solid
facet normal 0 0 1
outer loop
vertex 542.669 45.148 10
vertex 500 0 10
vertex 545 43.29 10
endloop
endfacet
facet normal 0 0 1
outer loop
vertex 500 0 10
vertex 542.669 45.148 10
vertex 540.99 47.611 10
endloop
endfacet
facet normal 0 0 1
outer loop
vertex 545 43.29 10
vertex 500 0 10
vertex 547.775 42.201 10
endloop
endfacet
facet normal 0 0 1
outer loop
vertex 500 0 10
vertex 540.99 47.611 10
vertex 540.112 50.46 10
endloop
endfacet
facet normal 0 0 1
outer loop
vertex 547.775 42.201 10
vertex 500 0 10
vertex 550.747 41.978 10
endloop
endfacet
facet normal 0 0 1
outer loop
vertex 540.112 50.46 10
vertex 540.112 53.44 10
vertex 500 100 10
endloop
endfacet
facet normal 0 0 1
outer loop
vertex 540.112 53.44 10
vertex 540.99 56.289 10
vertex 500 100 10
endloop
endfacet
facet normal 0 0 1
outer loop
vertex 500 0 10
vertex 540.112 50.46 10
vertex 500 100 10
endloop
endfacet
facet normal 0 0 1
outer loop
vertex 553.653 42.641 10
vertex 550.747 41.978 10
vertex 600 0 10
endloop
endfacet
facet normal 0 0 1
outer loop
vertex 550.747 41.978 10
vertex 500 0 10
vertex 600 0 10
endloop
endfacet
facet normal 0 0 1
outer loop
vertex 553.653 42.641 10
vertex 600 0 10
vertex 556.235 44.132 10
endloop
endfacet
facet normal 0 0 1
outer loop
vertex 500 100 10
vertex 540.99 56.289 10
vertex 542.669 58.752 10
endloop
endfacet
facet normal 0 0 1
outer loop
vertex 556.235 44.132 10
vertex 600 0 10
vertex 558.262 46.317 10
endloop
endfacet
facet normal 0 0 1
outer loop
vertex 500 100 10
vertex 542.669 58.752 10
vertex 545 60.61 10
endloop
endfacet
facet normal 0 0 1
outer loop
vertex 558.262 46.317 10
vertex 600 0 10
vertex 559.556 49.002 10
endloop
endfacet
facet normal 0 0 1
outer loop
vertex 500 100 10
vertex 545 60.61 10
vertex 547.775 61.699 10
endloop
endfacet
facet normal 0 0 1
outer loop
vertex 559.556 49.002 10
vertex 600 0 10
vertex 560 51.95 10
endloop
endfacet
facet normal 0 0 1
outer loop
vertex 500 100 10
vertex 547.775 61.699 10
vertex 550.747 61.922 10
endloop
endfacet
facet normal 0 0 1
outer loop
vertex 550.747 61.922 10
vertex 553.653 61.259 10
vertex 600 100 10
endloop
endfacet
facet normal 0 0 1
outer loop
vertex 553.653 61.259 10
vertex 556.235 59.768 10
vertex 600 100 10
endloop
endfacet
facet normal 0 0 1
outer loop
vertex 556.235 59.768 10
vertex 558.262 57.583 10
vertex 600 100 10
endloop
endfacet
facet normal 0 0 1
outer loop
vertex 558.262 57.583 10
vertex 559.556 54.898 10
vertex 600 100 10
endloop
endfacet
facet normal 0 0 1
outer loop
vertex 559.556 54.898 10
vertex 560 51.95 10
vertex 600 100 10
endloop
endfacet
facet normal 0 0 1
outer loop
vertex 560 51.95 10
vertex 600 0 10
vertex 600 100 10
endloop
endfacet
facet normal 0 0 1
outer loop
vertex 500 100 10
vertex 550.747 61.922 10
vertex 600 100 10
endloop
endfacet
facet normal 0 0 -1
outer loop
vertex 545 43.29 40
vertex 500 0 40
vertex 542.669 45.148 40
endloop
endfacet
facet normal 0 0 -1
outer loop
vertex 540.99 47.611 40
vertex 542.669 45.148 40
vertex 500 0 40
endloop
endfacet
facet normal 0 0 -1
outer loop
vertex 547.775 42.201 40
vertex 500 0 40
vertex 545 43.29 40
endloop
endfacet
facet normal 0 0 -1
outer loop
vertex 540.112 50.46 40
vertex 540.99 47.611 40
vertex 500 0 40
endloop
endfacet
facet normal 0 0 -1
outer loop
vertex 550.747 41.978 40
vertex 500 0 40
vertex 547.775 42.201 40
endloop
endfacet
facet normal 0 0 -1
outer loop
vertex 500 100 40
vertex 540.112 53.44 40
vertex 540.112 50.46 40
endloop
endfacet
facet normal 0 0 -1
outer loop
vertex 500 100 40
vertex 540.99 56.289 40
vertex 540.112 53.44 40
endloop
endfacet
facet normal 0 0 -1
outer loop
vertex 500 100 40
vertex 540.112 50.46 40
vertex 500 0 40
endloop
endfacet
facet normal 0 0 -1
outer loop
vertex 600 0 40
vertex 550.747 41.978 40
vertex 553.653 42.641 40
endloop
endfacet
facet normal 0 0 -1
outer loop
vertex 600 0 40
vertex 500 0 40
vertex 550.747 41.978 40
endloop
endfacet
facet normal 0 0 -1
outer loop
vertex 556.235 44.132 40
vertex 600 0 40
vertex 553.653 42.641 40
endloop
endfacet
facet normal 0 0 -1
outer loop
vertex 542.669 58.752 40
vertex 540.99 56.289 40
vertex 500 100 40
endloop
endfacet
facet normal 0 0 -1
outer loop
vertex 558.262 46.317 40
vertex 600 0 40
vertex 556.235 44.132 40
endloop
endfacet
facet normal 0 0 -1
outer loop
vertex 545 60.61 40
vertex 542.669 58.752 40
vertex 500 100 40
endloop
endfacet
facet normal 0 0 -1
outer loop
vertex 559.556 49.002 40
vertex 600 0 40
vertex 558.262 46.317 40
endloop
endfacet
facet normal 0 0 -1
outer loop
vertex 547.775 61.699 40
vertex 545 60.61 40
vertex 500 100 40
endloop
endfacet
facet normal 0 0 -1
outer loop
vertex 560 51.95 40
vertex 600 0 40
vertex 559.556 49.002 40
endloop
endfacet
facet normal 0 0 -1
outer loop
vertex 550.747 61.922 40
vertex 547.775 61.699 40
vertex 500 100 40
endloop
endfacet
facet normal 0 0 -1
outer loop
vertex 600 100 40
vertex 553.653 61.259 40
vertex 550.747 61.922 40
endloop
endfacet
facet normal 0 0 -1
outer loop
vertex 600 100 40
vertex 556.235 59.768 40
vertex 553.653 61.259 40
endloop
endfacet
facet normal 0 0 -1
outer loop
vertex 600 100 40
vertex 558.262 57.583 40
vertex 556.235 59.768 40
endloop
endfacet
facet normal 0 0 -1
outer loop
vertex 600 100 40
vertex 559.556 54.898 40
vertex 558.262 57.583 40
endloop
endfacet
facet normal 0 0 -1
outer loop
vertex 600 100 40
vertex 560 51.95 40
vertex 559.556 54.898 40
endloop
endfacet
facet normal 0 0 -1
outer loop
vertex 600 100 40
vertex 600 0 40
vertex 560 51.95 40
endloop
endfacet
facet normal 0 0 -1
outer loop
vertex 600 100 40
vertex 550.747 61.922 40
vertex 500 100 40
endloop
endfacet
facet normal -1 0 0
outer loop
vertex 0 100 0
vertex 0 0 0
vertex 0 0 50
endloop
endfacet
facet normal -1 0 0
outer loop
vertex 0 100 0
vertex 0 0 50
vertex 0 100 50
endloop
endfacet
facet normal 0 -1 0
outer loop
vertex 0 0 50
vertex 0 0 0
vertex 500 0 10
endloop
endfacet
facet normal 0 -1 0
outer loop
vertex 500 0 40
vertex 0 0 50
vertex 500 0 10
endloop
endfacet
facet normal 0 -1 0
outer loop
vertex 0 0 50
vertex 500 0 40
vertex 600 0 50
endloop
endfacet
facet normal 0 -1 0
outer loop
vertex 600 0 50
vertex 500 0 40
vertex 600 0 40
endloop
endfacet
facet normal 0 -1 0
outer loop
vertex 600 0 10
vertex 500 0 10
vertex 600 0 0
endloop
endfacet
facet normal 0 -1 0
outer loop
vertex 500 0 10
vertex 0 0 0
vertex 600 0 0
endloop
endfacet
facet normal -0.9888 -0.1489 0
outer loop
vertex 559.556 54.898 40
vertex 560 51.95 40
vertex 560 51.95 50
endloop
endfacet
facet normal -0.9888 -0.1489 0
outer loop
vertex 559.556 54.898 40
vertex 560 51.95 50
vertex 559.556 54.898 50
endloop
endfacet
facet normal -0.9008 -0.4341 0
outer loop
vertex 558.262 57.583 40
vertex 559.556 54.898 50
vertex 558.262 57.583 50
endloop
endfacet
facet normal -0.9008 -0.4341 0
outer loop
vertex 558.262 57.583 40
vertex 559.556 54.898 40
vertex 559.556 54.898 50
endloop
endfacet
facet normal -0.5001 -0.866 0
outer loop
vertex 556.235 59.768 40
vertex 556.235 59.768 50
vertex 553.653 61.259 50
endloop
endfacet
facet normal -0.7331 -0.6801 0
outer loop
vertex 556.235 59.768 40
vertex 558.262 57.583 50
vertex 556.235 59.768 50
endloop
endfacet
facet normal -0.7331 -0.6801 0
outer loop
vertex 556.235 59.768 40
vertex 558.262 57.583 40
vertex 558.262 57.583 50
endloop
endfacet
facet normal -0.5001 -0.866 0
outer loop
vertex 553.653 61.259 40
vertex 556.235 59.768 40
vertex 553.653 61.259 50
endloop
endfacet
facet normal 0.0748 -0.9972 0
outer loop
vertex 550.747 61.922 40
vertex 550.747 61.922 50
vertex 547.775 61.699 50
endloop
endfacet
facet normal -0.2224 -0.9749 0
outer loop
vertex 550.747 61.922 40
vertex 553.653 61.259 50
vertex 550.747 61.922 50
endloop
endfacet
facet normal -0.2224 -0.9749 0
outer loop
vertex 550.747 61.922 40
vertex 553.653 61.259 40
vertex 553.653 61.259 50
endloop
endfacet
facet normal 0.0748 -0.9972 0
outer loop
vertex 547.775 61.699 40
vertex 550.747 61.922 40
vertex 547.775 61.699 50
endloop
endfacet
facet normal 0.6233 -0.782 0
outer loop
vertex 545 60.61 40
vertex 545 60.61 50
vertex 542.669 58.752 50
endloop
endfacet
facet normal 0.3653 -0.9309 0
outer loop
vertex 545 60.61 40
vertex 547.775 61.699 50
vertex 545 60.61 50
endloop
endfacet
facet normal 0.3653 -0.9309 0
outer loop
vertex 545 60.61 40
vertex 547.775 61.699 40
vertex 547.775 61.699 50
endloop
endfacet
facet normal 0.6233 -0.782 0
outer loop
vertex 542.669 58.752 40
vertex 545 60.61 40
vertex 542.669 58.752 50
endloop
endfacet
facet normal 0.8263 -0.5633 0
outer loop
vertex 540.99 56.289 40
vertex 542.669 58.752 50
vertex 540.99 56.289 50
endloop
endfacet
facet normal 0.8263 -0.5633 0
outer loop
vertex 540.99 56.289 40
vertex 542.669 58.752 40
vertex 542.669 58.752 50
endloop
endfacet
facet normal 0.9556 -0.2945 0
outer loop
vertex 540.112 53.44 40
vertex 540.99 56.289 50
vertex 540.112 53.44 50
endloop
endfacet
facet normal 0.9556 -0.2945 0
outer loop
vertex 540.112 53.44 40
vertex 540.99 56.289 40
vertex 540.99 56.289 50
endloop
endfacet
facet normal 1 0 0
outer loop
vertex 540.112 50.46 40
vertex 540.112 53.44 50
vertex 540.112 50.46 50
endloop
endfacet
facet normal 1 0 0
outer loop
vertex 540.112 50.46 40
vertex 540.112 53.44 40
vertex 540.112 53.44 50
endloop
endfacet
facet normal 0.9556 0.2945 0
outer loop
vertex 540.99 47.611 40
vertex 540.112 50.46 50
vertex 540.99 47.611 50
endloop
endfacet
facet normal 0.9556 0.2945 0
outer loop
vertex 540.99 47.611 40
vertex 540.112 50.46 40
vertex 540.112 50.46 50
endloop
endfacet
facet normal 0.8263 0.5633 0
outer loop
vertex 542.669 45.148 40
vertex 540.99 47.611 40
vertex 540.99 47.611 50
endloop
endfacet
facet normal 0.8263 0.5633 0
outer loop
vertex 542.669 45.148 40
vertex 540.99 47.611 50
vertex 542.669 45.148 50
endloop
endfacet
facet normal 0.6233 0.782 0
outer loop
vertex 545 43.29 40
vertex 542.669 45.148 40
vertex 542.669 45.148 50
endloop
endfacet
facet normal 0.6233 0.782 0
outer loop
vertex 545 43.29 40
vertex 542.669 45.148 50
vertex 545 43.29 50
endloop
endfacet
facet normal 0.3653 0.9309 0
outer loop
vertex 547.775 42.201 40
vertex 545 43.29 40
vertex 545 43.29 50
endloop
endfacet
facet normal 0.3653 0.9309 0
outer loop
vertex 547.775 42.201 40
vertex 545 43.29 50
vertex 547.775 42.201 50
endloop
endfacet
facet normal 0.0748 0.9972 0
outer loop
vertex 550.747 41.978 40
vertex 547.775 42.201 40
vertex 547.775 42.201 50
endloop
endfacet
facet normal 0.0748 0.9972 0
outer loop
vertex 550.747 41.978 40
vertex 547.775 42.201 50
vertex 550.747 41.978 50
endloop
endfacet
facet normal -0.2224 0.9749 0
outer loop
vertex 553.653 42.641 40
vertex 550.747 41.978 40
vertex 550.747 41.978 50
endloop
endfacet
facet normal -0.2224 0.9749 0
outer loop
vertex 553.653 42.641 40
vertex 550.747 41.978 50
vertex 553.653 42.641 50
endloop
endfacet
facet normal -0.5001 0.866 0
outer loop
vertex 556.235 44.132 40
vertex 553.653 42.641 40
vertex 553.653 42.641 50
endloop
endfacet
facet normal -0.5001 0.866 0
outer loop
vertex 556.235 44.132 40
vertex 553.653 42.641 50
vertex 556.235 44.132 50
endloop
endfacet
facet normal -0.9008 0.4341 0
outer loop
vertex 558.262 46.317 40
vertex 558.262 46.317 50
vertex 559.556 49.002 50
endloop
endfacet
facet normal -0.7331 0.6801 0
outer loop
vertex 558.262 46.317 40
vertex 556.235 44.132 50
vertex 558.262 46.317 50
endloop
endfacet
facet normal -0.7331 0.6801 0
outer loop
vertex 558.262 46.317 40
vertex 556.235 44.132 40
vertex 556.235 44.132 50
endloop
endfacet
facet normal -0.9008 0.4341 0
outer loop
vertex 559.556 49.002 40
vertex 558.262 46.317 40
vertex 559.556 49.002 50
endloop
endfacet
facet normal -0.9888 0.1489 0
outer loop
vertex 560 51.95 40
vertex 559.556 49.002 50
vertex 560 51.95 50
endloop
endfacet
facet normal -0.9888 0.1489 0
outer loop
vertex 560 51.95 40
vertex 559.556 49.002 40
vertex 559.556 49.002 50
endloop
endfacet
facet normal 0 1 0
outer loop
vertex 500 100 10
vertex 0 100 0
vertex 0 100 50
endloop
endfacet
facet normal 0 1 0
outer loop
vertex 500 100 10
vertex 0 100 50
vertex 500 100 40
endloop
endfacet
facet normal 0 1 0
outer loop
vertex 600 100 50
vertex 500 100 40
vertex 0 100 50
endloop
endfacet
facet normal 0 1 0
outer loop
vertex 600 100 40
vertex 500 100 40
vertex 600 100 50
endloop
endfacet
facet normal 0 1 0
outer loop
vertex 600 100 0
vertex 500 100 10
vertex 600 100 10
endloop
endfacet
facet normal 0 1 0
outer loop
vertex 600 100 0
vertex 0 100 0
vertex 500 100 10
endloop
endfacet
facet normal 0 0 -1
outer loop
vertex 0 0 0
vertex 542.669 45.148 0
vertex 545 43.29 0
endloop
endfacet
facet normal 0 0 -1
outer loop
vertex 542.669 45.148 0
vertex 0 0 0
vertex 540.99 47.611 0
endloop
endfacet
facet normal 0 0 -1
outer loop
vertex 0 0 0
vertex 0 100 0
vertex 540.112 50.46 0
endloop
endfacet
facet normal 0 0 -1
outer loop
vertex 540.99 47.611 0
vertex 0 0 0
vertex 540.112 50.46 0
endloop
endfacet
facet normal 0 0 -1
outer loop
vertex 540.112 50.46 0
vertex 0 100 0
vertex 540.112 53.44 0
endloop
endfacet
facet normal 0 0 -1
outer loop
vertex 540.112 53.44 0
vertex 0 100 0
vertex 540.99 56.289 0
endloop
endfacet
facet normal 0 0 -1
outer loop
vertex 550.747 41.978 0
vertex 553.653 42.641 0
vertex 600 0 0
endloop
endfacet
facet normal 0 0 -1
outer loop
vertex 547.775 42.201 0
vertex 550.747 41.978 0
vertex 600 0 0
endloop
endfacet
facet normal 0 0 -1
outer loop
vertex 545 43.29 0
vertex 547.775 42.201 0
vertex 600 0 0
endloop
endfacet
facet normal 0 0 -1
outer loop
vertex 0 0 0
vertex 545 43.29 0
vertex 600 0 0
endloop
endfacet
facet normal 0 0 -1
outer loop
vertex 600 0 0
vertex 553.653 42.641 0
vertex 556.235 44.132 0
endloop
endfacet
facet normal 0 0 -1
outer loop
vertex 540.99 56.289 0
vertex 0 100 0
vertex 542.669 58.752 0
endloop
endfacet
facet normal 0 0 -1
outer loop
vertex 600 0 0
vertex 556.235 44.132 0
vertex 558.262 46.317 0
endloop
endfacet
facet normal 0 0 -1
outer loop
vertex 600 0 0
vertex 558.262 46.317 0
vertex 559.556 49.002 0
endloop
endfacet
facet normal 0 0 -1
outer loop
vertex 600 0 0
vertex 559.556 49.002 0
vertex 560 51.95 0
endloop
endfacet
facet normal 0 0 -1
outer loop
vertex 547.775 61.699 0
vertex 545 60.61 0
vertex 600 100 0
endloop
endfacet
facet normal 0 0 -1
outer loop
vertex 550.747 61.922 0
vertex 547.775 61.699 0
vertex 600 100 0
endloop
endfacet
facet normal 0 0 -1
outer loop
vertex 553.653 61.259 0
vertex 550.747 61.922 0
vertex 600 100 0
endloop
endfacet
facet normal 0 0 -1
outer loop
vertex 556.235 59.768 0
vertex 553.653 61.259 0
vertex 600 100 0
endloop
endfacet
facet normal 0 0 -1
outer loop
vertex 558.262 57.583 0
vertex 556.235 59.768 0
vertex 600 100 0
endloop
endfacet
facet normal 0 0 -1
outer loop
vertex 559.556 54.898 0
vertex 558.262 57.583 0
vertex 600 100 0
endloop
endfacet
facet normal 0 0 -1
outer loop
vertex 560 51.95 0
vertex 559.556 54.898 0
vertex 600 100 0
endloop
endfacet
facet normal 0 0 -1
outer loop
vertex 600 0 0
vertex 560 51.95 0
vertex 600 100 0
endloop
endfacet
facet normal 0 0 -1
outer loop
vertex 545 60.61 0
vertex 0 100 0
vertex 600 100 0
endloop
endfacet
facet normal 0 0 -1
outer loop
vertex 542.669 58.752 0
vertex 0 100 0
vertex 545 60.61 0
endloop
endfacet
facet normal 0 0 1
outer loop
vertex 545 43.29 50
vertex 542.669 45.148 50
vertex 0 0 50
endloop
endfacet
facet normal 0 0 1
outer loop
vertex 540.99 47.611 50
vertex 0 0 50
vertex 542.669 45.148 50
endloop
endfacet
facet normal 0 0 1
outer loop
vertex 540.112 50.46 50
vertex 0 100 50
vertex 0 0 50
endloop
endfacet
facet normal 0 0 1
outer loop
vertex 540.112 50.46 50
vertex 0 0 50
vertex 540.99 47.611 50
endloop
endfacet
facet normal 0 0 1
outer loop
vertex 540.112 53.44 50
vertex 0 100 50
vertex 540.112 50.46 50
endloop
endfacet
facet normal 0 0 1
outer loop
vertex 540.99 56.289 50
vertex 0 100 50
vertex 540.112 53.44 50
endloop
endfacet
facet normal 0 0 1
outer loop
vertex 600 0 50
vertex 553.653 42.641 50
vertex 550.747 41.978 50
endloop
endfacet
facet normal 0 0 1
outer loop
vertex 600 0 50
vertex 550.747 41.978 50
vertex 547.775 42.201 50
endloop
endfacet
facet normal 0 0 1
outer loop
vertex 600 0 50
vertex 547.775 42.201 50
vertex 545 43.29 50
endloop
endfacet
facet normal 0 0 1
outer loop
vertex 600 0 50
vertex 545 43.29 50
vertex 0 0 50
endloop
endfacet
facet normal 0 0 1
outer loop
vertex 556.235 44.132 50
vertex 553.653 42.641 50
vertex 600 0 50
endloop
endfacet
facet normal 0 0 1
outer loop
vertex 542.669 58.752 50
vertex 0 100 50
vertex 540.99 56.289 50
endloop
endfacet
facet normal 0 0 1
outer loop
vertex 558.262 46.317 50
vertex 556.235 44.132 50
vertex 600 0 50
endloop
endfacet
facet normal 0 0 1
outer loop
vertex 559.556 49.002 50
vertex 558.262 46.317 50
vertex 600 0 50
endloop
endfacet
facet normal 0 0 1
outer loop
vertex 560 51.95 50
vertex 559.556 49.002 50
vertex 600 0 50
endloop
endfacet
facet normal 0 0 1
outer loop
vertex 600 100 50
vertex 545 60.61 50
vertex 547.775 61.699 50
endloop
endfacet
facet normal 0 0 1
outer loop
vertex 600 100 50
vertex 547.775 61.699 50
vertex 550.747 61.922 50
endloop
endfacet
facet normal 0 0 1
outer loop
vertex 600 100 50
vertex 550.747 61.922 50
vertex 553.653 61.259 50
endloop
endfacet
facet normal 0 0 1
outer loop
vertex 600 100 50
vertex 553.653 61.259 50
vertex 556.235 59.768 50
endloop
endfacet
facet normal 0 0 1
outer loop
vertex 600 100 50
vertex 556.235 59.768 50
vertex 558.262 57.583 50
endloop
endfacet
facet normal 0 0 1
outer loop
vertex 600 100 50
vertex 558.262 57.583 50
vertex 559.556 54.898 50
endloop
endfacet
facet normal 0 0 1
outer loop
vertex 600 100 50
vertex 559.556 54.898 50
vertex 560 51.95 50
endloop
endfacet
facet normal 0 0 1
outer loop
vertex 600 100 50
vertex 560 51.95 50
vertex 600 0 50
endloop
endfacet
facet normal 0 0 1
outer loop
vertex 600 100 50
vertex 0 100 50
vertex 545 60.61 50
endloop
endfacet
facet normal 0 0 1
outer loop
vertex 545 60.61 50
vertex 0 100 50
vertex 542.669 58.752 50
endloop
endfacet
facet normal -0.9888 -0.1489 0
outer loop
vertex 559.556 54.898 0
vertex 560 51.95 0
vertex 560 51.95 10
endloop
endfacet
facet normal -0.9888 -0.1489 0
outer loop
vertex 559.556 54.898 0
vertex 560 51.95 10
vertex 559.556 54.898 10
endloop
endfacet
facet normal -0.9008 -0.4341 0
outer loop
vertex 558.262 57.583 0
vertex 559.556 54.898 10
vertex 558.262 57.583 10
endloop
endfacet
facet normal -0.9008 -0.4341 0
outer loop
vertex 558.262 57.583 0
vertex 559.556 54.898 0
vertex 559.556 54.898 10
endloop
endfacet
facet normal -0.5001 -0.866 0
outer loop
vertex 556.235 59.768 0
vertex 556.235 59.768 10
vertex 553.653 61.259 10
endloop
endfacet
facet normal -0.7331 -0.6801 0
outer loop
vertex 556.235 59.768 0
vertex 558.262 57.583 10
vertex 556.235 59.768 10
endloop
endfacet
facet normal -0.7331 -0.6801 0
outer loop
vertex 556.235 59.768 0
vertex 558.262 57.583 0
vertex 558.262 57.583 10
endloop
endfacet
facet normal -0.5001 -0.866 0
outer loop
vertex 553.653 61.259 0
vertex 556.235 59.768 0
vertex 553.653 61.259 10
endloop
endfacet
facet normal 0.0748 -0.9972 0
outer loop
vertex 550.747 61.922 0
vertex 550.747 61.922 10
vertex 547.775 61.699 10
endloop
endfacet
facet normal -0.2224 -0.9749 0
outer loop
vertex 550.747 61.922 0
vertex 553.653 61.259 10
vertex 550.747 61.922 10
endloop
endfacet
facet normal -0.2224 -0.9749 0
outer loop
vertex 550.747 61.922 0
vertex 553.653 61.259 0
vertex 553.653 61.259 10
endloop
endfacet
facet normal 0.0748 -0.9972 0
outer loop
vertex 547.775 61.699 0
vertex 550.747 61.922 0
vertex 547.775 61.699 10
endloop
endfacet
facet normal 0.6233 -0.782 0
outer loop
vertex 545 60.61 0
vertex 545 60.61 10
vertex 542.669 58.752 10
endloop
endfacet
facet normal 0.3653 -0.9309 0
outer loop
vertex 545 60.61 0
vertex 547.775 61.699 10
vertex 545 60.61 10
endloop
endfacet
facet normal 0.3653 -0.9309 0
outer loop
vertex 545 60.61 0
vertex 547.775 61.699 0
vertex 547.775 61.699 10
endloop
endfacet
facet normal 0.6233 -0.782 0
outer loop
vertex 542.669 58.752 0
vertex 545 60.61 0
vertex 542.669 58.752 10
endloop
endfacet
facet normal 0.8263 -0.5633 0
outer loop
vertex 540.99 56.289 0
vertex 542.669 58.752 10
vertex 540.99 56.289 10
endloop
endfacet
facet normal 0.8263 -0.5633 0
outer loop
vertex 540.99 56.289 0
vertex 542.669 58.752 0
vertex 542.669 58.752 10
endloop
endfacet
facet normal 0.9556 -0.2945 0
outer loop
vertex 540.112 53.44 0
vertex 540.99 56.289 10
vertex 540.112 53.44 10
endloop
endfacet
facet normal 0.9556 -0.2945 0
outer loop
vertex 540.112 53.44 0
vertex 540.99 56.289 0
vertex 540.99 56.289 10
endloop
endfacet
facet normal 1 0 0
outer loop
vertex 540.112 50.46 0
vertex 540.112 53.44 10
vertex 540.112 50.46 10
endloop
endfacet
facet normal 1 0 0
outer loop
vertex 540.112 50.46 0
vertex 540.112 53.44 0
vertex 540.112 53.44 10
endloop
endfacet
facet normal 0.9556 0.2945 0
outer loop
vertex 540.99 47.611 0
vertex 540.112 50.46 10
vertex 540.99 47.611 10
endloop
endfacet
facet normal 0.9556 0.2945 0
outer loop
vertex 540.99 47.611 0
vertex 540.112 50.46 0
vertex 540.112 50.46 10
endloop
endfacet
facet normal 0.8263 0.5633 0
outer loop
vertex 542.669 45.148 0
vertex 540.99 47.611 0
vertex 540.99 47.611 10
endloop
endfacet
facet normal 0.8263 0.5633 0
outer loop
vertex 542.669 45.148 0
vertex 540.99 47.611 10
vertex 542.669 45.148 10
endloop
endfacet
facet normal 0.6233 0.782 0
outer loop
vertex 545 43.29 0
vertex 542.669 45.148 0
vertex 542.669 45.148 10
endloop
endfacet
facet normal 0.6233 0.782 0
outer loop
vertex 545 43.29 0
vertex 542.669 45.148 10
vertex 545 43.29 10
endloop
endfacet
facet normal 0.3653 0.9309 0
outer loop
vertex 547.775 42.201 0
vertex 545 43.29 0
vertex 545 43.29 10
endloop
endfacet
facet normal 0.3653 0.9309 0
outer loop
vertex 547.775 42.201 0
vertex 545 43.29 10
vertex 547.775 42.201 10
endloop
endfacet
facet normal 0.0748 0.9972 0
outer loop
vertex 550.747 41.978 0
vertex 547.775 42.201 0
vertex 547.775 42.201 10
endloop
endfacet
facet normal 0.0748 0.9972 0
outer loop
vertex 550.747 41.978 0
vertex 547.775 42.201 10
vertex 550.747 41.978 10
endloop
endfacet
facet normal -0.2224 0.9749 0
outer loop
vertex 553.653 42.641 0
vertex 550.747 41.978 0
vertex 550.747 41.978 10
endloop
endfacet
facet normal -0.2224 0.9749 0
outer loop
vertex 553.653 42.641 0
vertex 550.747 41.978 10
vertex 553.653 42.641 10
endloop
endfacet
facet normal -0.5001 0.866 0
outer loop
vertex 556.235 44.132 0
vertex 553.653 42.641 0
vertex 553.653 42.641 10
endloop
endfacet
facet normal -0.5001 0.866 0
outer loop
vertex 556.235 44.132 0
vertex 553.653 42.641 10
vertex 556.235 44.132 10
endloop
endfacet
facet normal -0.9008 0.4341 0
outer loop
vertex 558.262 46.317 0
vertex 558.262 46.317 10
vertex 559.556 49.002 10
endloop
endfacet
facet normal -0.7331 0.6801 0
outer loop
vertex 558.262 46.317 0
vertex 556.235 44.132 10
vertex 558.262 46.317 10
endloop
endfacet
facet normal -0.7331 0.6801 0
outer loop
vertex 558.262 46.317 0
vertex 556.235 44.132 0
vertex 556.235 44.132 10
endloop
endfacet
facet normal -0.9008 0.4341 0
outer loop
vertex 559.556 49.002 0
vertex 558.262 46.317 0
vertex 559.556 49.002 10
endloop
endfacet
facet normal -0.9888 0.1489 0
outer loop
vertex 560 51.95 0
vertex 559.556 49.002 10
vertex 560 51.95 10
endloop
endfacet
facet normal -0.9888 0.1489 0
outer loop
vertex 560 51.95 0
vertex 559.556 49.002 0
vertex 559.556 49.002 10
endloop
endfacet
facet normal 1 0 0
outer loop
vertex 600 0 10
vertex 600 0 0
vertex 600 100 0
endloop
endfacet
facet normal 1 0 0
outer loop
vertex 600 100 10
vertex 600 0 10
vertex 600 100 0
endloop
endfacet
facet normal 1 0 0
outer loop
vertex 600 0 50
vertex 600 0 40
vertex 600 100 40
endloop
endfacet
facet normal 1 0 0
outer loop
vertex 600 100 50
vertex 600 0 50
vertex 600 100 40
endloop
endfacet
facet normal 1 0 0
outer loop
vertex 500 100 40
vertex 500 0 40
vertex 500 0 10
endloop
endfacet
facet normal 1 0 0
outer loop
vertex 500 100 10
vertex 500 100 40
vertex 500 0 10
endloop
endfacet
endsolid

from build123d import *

# Parameters (mm, degrees)
SKETCH1_W               = 600
SKETCH1_H               = 100
BOSS_EXTRUDE1_DEPTH     = 50
SKETCH2_W               = 30
SKETCH2_H               = 100
CUT_EXTRUDE1_DEPTH      = 100
CUT_EXTRUDE3_DEPTH      = 610.590026165
CUT_EXTRUDE3_DEPTH_BACK = 610.590026165
SKETCH3_R               = 10


with BuildPart() as part:
    # Sketch1 → Boss-Extrude1 (new body)
    with BuildSketch(Plane.XY):
        with Locations((300, 50)):
            Rectangle(SKETCH1_W, SKETCH1_H)
    extrude(amount=BOSS_EXTRUDE1_DEPTH)

    # Sketch2 → Cut-Extrude1 (cut)
    with BuildSketch(Plane(origin=(600, 0, 0), x_dir=(0, 0, -1), z_dir=(1, 0, 0))):
        with Locations((-25, 50)):
            Rectangle(SKETCH2_W, SKETCH2_H)
    extrude(amount=-CUT_EXTRUDE1_DEPTH, mode=Mode.SUBTRACT)

    # Sketch3 → Cut-Extrude3 (cut, two sides: drawn at the far end of the back side and taken through both)
    with BuildSketch(Plane.XY.offset(10).offset(-CUT_EXTRUDE3_DEPTH_BACK)):
        with Locations((550, 51.950023211)):
            Circle(SKETCH3_R)
    extrude(amount=CUT_EXTRUDE3_DEPTH + CUT_EXTRUDE3_DEPTH_BACK, mode=Mode.SUBTRACT)


solid = part.part
